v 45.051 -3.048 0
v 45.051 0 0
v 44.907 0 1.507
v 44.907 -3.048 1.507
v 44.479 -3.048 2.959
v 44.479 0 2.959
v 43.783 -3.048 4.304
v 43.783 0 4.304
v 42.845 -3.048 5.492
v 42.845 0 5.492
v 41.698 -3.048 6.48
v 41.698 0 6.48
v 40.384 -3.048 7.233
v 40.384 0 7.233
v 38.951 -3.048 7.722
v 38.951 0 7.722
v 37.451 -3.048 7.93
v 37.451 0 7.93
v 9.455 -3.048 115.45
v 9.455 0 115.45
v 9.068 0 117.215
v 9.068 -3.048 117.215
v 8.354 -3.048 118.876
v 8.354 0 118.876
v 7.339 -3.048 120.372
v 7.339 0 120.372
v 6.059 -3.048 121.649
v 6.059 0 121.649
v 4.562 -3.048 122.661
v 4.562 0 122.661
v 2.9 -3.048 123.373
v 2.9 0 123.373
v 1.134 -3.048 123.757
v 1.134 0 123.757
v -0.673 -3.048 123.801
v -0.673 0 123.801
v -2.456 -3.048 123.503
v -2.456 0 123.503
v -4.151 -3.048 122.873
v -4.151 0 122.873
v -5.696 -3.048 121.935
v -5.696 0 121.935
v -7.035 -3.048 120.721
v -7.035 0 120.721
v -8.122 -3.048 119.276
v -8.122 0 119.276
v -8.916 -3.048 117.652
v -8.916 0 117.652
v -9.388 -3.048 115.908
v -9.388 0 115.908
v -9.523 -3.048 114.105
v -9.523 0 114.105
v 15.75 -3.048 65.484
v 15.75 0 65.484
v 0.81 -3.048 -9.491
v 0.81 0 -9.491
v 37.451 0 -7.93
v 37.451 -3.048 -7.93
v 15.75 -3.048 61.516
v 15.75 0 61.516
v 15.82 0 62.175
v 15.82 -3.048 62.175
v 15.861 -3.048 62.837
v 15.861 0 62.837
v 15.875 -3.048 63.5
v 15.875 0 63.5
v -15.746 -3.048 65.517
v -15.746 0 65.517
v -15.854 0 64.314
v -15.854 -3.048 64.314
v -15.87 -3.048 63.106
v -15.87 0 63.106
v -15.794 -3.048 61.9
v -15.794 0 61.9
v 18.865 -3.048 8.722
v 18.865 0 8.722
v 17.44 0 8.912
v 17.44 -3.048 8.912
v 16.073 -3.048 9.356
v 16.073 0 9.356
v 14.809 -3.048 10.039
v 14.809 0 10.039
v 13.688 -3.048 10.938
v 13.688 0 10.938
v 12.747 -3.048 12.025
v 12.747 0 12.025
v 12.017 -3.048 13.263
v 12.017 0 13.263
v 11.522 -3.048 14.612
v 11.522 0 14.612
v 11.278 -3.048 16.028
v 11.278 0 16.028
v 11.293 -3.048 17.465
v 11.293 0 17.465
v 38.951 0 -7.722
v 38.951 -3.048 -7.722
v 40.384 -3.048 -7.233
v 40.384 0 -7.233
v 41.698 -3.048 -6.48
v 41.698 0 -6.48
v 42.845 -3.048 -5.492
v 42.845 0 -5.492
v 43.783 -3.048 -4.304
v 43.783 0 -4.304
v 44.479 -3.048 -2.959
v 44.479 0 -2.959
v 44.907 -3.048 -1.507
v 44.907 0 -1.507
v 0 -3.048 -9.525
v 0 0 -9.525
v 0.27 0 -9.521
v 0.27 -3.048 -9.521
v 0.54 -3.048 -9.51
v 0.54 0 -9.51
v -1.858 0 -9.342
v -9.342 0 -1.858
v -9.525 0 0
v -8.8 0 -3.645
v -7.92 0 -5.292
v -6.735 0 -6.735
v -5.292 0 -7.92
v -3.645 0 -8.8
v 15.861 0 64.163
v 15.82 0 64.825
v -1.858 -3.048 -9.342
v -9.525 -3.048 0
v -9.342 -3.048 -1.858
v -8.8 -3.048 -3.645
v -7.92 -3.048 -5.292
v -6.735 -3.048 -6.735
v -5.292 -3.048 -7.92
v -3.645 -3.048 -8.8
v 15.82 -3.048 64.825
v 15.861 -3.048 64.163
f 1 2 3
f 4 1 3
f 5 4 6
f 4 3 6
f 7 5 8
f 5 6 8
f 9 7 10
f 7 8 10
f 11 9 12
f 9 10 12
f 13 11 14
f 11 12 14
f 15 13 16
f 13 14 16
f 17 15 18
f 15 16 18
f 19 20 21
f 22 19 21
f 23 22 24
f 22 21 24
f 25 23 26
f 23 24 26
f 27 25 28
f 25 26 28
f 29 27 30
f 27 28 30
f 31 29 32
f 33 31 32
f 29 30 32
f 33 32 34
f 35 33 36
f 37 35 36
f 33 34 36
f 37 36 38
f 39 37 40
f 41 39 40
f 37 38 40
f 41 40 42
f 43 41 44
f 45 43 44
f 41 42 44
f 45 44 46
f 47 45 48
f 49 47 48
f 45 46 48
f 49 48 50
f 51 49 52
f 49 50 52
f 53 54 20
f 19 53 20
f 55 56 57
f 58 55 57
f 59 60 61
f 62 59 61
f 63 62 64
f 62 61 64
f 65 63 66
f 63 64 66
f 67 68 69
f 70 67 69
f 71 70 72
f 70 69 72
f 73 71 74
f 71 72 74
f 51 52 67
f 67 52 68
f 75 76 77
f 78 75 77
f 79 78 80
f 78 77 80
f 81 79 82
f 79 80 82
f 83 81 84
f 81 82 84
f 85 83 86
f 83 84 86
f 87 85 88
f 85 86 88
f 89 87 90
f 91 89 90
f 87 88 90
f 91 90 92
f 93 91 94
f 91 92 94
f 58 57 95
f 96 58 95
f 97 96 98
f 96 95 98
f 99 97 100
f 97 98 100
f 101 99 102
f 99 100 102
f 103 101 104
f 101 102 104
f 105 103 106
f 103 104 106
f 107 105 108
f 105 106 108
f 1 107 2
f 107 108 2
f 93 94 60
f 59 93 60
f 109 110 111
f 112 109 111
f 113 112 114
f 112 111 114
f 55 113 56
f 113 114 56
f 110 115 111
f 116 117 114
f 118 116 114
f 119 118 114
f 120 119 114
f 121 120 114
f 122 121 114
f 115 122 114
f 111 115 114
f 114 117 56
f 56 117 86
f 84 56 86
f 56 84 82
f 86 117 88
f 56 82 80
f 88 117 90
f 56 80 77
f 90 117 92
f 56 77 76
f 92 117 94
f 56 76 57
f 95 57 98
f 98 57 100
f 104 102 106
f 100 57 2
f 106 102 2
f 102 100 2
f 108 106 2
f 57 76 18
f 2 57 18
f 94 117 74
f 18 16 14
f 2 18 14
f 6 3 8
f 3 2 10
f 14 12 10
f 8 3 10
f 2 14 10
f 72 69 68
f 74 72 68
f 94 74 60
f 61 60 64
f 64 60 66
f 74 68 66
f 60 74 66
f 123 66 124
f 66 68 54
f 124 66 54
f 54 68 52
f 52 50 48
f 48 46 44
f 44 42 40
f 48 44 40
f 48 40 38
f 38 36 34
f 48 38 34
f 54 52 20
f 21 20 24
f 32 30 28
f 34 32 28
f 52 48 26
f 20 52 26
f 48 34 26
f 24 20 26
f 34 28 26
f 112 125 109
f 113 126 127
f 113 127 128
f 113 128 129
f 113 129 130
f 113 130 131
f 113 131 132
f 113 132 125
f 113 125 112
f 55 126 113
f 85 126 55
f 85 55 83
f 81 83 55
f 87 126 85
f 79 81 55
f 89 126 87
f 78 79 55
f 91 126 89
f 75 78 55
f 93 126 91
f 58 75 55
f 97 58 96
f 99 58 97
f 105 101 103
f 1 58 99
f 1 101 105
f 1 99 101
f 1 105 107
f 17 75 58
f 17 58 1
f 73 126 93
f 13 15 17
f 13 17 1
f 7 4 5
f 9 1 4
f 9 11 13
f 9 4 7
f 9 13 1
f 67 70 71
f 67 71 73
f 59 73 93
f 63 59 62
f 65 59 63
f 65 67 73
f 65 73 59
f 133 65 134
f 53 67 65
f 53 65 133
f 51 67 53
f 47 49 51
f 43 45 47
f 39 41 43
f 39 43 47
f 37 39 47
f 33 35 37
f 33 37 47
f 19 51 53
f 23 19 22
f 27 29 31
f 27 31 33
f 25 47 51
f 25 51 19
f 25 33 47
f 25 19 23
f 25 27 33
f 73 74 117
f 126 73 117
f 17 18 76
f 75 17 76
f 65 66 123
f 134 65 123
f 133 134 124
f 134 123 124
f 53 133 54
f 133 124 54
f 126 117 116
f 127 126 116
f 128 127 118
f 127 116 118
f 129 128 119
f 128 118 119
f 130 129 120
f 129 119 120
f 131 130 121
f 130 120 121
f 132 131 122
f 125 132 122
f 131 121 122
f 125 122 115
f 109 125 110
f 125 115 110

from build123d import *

# Parameters (mm, degrees)
F0_R     = 1.5875
F0_R_2   = 3.175
F1_DEPTH = 3.048


with BuildPart() as f1:
    # F0 (on Front) → F1 (new body)
    with BuildSketch(Plane.XZ):
        with BuildLine():
            ThreePointArc((45.0512324214, 0), (42.8445348199, 5.4919768863), (37.4514062495, 7.9303141575))
            ThreePointArc((37.4514062495, 7.9303141575), (29.1762324214, 0), (37.4514062495, -7.9303141575))
            ThreePointArc((37.4514062495, -7.9303141575), (42.8445348199, -5.4919768863), (45.0512324214, 0))
        make_face()
        with BuildLine():
            ThreePointArc((9.4553399063, 115.449857494), (9.507569027, 114.875982809), (9.525, 114.3))
            ThreePointArc((9.525, 114.3), (0.0975597085, 104.7754996402), (-9.5230014915, 114.1048908181))
            Line((-9.5230014915, 114.1048908181), (-15.7463614541, 65.5168604207))
            ThreePointArc((-15.7463614541, 65.5168604207), (0.016359288, 79.3749915708), (15.7504847833, 65.484402704))
            Line((15.7504847833, 65.484402704), (9.4553399063, 115.449857494))
        make_face()
        with Locations((-6.3508603799, 99.4688310552)):
            Circle(F0_R, mode=Mode.SUBTRACT)
        with BuildLine():
            ThreePointArc((15.875, 63.5), (15.8438406161, 64.4941526707), (15.7504847833, 65.484402704))
            ThreePointArc((15.7504847833, 65.484402704), (0.016359288, 79.3749915708), (-15.7463614541, 65.5168604207))
            ThreePointArc((-15.7463614541, 65.5168604207), (-15.8736111305, 63.7099873296), (-15.7942028036, 61.9003804205))
            ThreePointArc((-15.7942028036, 61.9003804205), (-0.1936293613, 47.6261809047), (15.7504847833, 61.515597296))
            ThreePointArc((15.7504847833, 61.515597296), (15.8438406161, 62.5058473293), (15.875, 63.5))
        make_face()
        with Locations((0, 63.5)):
            Circle(F0_R_2, mode=Mode.SUBTRACT)
        with BuildLine():
            ThreePointArc((-9.5230014915, 114.1048908181), (0.0975597085, 104.7754996402), (9.525, 114.3))
            ThreePointArc((9.525, 114.3), (9.507569027, 114.875982809), (9.4553399063, 115.449857494))
            ThreePointArc((9.4553399063, 115.449857494), (-0.6733337674, 123.8011708035), (-9.5230014915, 114.1048908181))
        make_face()
        with Locations((0, 114.3)):
            Circle(F0_R_2, mode=Mode.SUBTRACT)
        with BuildLine():
            ThreePointArc((15.7504847833, 61.515597296), (-0.1936293613, 47.6261809047), (-15.7942028036, 61.9003804205))
            Line((-15.7942028036, 61.9003804205), (-9.525, 0))
            ThreePointArc((-9.525, 0), (-6.7351920908, 6.7351920908), (0, 9.525))
            ThreePointArc((0, 9.525), (0.4052085937, 9.5163769889), (0.8096835142, 9.4905235686))
            ThreePointArc((0.8096835142, 9.4905235686), (7.0156204456, 6.4425689568), (9.525, 0))
            ThreePointArc((9.525, 0), (7.0156204456, -6.4425689568), (0.8096835142, -9.4905235686))
            Line((0.8096835142, -9.4905235686), (37.4514062495, -7.9303141575))
            ThreePointArc((37.4514062495, -7.9303141575), (29.1762324214, 0), (37.4514062495, 7.9303141575))
            Line((37.4514062495, 7.9303141575), (18.8646837389, 8.7217392657))
            ThreePointArc((18.8646837389, 8.7217392657), (13.1929762999, 11.4602704772), (11.2930893163, 17.4651225086))
            Line((11.2930893163, 17.4651225086), (15.7504847833, 61.515597296))
        make_face()
        with Locations((0, 63.5)):
            Circle(F0_R_2)
        with Locations((-6.3508603799, 99.4688310552)):
            Circle(F0_R)
        with BuildLine():
            ThreePointArc((0, 9.525), (-6.7351920908, 6.7351920908), (-9.525, 0))
            ThreePointArc((-9.525, 0), (-6.7351920908, -6.7351920908), (0, -9.525))
            Line((0, -9.525), (0.8096835142, -9.4905235686))
            ThreePointArc((0.8096835142, -9.4905235686), (7.0156204456, -6.4425689568), (9.525, 0))
            ThreePointArc((9.525, 0), (7.0156204456, 6.4425689568), (0.8096835142, 9.4905235686))
            Line((0.8096835142, 9.4905235686), (0, 9.525))
        make_face()
        with BuildLine():
            Line((0.8096835142, -9.4905235686), (0, -9.525))
            ThreePointArc((0, -9.525), (0.4052085937, -9.5163769889), (0.8096835142, -9.4905235686))
        make_face()
        with BuildLine():
            ThreePointArc((0.8096835142, 9.4905235686), (0.4052085937, 9.5163769889), (0, 9.525))
            Line((0, 9.525), (0.8096835142, 9.4905235686))
        make_face()
        with Locations((0, 114.3)):
            Circle(F0_R_2)
    extrude(amount=F1_DEPTH)


solid = f1.part
